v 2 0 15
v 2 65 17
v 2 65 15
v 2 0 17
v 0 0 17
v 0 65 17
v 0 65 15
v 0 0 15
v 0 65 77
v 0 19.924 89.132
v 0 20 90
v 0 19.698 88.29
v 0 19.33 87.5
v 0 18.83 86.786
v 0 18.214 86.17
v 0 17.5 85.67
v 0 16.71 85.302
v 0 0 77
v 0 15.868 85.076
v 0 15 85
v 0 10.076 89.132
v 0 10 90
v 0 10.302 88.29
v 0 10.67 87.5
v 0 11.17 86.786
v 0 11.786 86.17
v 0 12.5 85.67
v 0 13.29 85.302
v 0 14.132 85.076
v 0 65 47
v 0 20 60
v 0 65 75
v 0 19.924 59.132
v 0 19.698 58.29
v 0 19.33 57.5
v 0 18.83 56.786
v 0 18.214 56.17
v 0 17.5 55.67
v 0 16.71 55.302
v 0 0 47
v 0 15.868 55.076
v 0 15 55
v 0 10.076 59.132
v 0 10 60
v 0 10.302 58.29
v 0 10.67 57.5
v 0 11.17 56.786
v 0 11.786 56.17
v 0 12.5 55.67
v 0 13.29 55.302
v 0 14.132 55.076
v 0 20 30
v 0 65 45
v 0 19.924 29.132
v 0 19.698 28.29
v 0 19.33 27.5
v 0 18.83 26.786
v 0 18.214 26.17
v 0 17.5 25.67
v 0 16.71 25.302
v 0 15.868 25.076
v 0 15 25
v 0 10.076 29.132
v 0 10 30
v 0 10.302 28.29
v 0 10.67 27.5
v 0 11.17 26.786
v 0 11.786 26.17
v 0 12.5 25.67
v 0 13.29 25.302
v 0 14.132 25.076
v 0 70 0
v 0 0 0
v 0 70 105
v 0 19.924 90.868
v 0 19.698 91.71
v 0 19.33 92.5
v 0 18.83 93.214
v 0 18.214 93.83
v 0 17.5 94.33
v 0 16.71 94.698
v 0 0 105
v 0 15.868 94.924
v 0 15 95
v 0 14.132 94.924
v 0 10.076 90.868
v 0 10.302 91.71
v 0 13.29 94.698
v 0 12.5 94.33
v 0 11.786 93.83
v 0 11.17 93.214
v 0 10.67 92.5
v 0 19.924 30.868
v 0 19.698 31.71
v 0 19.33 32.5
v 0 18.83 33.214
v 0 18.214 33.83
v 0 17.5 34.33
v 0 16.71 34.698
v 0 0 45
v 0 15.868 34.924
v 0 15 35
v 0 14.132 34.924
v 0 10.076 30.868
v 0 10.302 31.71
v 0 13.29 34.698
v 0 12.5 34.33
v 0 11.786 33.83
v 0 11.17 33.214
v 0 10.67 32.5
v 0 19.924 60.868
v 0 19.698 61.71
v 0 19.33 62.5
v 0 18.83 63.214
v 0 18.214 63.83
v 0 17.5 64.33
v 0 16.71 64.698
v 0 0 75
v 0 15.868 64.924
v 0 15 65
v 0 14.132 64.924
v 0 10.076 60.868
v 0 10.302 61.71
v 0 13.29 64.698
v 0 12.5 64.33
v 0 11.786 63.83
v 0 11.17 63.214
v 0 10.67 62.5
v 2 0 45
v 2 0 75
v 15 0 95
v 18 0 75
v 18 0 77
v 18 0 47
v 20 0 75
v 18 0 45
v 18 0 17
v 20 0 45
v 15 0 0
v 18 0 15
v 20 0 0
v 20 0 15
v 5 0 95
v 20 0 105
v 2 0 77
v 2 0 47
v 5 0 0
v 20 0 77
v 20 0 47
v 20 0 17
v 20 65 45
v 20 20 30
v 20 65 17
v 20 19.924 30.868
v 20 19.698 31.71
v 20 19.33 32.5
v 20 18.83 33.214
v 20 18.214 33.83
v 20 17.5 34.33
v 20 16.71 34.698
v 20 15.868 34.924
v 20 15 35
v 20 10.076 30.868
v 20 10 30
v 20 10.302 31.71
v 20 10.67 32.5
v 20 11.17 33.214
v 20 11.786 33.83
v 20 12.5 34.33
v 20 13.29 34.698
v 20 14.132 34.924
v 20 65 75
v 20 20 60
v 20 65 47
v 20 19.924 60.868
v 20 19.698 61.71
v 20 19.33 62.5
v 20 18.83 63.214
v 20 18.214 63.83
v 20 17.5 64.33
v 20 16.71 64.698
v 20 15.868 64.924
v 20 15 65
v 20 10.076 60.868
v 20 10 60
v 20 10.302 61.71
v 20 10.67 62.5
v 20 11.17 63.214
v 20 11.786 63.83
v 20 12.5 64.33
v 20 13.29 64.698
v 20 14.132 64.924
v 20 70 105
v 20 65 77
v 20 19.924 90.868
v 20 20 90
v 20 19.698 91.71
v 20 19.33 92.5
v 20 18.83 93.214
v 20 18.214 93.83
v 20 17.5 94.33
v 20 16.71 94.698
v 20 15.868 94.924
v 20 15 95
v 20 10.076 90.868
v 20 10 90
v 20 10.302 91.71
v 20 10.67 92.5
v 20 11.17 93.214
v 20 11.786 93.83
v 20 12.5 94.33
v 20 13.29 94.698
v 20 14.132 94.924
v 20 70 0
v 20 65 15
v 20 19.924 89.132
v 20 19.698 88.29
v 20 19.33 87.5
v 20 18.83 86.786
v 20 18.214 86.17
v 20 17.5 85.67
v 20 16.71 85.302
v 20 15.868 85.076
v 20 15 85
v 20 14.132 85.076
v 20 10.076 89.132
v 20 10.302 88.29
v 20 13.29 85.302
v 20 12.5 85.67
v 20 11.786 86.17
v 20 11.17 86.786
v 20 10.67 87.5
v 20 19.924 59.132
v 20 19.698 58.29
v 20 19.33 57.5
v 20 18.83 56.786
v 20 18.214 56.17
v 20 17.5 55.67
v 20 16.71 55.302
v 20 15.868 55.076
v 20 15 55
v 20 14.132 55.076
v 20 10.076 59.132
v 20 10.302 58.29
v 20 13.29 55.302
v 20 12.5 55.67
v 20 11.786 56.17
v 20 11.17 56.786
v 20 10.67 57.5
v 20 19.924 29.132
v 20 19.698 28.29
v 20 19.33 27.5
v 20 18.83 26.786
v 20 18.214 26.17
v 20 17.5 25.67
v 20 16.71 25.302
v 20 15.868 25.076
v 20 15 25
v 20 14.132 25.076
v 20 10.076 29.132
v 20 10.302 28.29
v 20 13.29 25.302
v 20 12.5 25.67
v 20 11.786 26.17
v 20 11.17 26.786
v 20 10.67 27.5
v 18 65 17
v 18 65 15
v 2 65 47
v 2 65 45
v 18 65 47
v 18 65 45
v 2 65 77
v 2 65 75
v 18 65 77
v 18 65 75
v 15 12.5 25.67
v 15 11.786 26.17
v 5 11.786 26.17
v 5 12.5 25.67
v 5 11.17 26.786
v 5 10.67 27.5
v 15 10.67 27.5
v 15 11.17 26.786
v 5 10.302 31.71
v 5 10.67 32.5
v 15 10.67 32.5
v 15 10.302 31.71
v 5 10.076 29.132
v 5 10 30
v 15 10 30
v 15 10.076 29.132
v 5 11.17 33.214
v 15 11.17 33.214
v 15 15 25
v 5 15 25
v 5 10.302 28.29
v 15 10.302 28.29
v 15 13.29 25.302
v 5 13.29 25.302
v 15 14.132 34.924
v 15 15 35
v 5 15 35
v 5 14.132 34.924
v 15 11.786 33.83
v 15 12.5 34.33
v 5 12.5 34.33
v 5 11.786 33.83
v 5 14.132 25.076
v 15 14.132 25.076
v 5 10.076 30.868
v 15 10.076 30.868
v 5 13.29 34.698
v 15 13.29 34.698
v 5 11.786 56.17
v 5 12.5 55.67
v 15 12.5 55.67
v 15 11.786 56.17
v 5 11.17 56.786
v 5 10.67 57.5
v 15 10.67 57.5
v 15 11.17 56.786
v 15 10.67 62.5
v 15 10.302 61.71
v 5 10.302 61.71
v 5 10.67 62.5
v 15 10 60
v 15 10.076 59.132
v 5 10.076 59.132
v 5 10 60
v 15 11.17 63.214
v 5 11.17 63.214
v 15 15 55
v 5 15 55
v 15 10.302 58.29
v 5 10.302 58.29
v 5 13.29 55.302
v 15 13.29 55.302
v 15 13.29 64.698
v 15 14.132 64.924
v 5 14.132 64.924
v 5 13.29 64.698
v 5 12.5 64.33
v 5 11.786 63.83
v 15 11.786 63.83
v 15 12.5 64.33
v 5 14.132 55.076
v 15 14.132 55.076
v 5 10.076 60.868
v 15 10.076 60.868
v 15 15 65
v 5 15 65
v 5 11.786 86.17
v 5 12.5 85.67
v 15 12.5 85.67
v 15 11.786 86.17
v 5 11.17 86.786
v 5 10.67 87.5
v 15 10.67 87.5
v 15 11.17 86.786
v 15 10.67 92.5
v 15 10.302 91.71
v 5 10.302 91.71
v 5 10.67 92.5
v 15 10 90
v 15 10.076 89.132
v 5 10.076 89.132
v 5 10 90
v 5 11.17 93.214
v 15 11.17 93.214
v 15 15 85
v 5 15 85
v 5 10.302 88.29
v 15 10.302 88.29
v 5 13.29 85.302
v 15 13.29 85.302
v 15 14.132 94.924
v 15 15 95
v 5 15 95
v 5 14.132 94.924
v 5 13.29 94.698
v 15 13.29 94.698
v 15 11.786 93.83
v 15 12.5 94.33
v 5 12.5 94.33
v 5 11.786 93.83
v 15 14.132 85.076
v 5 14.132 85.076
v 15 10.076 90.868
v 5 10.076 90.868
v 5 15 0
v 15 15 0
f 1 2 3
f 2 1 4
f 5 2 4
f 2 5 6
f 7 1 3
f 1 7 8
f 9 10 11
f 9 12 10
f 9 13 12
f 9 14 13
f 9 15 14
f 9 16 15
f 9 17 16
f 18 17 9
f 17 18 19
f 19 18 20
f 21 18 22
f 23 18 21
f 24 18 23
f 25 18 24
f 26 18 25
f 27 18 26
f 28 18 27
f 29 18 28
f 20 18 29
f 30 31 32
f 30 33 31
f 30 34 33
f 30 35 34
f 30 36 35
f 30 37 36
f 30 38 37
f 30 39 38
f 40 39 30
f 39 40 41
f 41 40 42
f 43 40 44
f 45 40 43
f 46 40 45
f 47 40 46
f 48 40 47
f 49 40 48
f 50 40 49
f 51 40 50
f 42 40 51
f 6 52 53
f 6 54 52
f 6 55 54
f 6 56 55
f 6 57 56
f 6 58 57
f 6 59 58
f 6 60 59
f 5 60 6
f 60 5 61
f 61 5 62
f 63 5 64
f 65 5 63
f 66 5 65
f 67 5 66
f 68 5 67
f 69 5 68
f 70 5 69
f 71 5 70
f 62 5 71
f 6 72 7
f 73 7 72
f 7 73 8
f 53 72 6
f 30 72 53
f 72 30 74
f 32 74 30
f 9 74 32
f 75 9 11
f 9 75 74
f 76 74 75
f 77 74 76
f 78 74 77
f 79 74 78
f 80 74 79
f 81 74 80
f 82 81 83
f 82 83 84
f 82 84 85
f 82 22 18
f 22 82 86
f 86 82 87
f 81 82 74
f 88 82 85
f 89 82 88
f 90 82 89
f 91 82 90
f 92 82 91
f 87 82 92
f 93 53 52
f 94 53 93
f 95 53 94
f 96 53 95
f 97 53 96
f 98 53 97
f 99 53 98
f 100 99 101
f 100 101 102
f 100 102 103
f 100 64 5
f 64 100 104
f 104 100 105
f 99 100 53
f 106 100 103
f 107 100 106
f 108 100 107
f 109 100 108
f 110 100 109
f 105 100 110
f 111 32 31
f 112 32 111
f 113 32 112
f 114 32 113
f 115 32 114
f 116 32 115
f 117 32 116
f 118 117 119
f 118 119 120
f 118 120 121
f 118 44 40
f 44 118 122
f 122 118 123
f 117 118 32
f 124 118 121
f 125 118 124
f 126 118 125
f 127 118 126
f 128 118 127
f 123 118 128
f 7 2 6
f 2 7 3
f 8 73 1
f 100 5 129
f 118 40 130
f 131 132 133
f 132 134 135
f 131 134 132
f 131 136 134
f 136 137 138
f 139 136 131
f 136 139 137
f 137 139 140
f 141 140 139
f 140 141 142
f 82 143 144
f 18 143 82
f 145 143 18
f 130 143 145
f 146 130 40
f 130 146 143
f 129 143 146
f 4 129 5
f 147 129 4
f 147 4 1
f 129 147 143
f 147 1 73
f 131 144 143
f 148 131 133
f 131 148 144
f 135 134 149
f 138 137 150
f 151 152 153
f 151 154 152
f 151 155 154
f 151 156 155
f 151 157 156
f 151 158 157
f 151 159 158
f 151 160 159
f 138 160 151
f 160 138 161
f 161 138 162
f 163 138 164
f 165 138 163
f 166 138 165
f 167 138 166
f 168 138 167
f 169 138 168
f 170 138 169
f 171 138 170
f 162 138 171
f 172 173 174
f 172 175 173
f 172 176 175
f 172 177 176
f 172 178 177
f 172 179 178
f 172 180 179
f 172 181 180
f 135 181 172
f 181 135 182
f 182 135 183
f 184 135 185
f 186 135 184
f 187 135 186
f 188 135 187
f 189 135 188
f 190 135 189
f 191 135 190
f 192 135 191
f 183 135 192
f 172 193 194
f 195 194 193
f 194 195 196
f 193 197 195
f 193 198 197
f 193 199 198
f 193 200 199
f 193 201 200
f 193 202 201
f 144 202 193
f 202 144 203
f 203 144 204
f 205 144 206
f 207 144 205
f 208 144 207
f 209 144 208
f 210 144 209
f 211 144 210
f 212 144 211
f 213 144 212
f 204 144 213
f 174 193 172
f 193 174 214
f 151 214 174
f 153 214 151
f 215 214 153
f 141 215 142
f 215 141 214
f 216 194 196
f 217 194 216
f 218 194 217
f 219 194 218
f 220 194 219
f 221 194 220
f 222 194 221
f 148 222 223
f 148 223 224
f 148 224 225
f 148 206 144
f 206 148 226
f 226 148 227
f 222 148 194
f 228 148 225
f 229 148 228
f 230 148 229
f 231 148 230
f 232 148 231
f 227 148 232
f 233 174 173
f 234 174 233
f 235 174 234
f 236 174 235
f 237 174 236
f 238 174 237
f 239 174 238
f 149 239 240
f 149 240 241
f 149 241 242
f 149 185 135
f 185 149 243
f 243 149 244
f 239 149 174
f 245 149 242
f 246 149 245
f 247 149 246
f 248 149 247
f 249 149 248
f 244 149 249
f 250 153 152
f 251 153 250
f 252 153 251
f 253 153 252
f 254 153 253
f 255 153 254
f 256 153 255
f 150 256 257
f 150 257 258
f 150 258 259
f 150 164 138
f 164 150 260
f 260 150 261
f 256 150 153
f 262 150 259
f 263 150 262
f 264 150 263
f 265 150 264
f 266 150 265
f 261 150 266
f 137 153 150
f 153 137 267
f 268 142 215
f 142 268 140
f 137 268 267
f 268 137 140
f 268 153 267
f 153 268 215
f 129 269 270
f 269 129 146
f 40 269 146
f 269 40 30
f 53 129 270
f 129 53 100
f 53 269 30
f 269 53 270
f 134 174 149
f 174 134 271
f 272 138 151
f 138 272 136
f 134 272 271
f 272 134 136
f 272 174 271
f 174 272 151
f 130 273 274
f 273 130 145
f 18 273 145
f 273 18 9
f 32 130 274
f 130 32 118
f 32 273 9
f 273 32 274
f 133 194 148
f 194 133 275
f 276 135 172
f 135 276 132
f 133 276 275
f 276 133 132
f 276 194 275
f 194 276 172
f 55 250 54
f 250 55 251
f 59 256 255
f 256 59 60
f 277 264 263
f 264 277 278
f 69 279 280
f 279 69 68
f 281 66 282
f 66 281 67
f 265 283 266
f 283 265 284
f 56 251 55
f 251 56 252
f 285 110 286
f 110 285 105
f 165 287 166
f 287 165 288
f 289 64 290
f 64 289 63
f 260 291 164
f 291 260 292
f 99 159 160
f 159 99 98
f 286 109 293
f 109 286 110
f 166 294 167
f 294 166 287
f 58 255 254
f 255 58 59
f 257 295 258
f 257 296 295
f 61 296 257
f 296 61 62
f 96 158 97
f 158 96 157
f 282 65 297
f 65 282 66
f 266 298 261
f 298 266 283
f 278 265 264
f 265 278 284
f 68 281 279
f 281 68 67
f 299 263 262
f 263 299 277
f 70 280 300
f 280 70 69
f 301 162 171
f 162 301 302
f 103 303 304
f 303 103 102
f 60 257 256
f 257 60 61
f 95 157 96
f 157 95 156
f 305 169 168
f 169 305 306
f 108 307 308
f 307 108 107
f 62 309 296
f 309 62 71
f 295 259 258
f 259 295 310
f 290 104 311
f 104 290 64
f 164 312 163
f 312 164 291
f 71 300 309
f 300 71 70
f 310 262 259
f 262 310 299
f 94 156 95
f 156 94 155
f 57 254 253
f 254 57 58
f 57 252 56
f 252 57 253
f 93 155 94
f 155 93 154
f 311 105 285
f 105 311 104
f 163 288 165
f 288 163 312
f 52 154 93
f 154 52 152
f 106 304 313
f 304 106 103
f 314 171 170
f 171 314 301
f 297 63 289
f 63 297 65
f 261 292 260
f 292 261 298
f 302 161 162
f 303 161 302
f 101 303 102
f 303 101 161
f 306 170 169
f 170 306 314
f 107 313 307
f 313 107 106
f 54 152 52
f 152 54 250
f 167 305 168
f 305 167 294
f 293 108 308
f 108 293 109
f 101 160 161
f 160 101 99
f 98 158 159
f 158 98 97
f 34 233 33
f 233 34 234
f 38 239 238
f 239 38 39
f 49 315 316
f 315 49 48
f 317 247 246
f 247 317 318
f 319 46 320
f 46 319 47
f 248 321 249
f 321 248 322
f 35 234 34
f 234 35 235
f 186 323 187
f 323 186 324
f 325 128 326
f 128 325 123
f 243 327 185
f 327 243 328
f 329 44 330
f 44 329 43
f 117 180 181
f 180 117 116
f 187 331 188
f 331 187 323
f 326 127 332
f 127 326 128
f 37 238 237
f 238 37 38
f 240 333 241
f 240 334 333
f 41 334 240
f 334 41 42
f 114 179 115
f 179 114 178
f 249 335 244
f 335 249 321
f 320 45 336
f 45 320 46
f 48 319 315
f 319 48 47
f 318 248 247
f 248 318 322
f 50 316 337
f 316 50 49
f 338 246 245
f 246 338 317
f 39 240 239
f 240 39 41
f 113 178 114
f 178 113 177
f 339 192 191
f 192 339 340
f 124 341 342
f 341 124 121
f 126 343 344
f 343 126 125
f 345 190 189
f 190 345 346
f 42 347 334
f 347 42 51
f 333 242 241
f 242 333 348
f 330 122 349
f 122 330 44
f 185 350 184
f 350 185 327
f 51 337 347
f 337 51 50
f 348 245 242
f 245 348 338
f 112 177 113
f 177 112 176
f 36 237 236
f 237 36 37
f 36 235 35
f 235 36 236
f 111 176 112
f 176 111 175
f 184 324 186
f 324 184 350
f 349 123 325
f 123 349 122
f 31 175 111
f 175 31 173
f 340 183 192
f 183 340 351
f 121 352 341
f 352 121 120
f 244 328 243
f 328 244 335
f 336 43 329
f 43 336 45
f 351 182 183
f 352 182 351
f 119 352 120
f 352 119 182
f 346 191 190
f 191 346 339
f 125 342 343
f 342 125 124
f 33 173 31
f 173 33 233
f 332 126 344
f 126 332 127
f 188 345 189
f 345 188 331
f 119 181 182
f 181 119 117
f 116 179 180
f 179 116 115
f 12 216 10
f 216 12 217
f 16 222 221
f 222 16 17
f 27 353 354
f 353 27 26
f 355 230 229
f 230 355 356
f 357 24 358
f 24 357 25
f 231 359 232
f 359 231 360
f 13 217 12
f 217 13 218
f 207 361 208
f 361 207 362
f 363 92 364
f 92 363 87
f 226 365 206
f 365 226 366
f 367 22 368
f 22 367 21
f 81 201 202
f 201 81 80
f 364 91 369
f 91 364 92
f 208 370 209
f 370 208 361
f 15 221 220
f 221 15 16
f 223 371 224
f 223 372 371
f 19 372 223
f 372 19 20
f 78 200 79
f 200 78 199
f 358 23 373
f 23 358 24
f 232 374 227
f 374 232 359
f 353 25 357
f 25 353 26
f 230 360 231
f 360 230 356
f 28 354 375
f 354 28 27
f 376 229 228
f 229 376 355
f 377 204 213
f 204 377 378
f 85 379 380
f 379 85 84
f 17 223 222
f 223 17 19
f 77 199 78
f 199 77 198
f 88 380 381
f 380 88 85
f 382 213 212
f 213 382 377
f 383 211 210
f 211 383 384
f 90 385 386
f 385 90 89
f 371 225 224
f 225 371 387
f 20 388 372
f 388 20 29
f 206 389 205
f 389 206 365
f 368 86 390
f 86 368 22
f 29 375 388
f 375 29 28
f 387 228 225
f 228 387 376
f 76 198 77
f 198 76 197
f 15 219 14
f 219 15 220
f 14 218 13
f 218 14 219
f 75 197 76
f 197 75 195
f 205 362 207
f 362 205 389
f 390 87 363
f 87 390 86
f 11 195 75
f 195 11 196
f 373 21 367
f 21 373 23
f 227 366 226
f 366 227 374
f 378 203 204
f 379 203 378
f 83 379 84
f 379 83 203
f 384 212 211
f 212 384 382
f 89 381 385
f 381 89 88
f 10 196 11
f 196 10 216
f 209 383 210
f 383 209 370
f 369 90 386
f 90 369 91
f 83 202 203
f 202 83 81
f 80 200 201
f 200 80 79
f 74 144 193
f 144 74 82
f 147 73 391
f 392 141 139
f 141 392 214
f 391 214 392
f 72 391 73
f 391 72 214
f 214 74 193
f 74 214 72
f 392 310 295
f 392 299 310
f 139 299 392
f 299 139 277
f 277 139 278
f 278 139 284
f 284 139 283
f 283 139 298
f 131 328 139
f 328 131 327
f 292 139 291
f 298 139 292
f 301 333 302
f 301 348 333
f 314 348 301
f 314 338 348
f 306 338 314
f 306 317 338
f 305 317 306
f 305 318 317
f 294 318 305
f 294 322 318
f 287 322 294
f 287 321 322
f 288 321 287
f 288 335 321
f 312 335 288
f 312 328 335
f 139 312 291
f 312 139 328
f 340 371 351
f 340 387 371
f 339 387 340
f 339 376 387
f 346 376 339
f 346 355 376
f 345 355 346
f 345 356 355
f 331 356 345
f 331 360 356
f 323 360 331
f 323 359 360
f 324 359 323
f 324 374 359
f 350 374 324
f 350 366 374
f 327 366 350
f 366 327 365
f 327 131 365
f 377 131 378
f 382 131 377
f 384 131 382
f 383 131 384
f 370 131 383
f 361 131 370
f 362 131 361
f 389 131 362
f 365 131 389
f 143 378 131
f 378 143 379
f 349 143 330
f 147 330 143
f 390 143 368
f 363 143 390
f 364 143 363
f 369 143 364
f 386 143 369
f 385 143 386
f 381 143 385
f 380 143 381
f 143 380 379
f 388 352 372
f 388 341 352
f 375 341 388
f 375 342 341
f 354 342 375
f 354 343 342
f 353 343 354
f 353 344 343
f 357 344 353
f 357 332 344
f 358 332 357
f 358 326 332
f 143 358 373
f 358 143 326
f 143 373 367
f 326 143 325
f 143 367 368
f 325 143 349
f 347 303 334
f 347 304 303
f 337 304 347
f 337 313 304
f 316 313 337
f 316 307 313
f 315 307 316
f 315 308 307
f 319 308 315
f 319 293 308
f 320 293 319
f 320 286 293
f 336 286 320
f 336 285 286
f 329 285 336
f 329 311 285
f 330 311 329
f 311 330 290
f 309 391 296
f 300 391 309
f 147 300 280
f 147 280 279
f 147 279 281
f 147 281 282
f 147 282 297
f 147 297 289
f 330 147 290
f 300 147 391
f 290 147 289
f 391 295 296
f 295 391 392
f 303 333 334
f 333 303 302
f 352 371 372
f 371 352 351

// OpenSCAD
node_count=3;
space_between_nodes=30;
rack_width=20;
rack_depth=70;
slot_depth=2;
slot_length=65;
power_feed_width=10;

module insert_slots(count) {
    for(i=[0:count-1]) {
        translate([0, 0, space_between_nodes * i + space_between_nodes/2])
            cube(
                size=[
                    slot_depth,
                    slot_length,
                    slot_depth
                ],
                center=false
            );

        translate([rack_width-slot_depth , 0, space_between_nodes * i + space_between_nodes/2])
            cube(
                size=[
                    slot_depth,
                    slot_length,
                    slot_depth
                ],
                center=false
            );
    }
}

module power_feed_hole(count) {
    for(i=[0:count-1]) {
        translate([0, space_between_nodes/2, space_between_nodes * i + space_between_nodes])
        rotate([0,90,0])
            cylinder(h=rack_width, r=10/2, center=false, $fn=36);

    }
}
module power_feed(count) {
    translate([rack_width/2 - power_feed_width / 2, 0, 0])
        cube(
            size=[
                power_feed_width,
                space_between_nodes / 2,
                space_between_nodes * node_count + space_between_nodes / 2 - (rack_width/2)
            ],
            center=false
        );

}


difference() {
    cube(
        size=[
            rack_width,
            rack_depth,
            space_between_nodes * node_count + space_between_nodes / 2
        ],
        center=false
    );
    color("orange") insert_slots(count=node_count);
    color("red") power_feed_hole(count=node_count);
    color("red") power_feed();
}
